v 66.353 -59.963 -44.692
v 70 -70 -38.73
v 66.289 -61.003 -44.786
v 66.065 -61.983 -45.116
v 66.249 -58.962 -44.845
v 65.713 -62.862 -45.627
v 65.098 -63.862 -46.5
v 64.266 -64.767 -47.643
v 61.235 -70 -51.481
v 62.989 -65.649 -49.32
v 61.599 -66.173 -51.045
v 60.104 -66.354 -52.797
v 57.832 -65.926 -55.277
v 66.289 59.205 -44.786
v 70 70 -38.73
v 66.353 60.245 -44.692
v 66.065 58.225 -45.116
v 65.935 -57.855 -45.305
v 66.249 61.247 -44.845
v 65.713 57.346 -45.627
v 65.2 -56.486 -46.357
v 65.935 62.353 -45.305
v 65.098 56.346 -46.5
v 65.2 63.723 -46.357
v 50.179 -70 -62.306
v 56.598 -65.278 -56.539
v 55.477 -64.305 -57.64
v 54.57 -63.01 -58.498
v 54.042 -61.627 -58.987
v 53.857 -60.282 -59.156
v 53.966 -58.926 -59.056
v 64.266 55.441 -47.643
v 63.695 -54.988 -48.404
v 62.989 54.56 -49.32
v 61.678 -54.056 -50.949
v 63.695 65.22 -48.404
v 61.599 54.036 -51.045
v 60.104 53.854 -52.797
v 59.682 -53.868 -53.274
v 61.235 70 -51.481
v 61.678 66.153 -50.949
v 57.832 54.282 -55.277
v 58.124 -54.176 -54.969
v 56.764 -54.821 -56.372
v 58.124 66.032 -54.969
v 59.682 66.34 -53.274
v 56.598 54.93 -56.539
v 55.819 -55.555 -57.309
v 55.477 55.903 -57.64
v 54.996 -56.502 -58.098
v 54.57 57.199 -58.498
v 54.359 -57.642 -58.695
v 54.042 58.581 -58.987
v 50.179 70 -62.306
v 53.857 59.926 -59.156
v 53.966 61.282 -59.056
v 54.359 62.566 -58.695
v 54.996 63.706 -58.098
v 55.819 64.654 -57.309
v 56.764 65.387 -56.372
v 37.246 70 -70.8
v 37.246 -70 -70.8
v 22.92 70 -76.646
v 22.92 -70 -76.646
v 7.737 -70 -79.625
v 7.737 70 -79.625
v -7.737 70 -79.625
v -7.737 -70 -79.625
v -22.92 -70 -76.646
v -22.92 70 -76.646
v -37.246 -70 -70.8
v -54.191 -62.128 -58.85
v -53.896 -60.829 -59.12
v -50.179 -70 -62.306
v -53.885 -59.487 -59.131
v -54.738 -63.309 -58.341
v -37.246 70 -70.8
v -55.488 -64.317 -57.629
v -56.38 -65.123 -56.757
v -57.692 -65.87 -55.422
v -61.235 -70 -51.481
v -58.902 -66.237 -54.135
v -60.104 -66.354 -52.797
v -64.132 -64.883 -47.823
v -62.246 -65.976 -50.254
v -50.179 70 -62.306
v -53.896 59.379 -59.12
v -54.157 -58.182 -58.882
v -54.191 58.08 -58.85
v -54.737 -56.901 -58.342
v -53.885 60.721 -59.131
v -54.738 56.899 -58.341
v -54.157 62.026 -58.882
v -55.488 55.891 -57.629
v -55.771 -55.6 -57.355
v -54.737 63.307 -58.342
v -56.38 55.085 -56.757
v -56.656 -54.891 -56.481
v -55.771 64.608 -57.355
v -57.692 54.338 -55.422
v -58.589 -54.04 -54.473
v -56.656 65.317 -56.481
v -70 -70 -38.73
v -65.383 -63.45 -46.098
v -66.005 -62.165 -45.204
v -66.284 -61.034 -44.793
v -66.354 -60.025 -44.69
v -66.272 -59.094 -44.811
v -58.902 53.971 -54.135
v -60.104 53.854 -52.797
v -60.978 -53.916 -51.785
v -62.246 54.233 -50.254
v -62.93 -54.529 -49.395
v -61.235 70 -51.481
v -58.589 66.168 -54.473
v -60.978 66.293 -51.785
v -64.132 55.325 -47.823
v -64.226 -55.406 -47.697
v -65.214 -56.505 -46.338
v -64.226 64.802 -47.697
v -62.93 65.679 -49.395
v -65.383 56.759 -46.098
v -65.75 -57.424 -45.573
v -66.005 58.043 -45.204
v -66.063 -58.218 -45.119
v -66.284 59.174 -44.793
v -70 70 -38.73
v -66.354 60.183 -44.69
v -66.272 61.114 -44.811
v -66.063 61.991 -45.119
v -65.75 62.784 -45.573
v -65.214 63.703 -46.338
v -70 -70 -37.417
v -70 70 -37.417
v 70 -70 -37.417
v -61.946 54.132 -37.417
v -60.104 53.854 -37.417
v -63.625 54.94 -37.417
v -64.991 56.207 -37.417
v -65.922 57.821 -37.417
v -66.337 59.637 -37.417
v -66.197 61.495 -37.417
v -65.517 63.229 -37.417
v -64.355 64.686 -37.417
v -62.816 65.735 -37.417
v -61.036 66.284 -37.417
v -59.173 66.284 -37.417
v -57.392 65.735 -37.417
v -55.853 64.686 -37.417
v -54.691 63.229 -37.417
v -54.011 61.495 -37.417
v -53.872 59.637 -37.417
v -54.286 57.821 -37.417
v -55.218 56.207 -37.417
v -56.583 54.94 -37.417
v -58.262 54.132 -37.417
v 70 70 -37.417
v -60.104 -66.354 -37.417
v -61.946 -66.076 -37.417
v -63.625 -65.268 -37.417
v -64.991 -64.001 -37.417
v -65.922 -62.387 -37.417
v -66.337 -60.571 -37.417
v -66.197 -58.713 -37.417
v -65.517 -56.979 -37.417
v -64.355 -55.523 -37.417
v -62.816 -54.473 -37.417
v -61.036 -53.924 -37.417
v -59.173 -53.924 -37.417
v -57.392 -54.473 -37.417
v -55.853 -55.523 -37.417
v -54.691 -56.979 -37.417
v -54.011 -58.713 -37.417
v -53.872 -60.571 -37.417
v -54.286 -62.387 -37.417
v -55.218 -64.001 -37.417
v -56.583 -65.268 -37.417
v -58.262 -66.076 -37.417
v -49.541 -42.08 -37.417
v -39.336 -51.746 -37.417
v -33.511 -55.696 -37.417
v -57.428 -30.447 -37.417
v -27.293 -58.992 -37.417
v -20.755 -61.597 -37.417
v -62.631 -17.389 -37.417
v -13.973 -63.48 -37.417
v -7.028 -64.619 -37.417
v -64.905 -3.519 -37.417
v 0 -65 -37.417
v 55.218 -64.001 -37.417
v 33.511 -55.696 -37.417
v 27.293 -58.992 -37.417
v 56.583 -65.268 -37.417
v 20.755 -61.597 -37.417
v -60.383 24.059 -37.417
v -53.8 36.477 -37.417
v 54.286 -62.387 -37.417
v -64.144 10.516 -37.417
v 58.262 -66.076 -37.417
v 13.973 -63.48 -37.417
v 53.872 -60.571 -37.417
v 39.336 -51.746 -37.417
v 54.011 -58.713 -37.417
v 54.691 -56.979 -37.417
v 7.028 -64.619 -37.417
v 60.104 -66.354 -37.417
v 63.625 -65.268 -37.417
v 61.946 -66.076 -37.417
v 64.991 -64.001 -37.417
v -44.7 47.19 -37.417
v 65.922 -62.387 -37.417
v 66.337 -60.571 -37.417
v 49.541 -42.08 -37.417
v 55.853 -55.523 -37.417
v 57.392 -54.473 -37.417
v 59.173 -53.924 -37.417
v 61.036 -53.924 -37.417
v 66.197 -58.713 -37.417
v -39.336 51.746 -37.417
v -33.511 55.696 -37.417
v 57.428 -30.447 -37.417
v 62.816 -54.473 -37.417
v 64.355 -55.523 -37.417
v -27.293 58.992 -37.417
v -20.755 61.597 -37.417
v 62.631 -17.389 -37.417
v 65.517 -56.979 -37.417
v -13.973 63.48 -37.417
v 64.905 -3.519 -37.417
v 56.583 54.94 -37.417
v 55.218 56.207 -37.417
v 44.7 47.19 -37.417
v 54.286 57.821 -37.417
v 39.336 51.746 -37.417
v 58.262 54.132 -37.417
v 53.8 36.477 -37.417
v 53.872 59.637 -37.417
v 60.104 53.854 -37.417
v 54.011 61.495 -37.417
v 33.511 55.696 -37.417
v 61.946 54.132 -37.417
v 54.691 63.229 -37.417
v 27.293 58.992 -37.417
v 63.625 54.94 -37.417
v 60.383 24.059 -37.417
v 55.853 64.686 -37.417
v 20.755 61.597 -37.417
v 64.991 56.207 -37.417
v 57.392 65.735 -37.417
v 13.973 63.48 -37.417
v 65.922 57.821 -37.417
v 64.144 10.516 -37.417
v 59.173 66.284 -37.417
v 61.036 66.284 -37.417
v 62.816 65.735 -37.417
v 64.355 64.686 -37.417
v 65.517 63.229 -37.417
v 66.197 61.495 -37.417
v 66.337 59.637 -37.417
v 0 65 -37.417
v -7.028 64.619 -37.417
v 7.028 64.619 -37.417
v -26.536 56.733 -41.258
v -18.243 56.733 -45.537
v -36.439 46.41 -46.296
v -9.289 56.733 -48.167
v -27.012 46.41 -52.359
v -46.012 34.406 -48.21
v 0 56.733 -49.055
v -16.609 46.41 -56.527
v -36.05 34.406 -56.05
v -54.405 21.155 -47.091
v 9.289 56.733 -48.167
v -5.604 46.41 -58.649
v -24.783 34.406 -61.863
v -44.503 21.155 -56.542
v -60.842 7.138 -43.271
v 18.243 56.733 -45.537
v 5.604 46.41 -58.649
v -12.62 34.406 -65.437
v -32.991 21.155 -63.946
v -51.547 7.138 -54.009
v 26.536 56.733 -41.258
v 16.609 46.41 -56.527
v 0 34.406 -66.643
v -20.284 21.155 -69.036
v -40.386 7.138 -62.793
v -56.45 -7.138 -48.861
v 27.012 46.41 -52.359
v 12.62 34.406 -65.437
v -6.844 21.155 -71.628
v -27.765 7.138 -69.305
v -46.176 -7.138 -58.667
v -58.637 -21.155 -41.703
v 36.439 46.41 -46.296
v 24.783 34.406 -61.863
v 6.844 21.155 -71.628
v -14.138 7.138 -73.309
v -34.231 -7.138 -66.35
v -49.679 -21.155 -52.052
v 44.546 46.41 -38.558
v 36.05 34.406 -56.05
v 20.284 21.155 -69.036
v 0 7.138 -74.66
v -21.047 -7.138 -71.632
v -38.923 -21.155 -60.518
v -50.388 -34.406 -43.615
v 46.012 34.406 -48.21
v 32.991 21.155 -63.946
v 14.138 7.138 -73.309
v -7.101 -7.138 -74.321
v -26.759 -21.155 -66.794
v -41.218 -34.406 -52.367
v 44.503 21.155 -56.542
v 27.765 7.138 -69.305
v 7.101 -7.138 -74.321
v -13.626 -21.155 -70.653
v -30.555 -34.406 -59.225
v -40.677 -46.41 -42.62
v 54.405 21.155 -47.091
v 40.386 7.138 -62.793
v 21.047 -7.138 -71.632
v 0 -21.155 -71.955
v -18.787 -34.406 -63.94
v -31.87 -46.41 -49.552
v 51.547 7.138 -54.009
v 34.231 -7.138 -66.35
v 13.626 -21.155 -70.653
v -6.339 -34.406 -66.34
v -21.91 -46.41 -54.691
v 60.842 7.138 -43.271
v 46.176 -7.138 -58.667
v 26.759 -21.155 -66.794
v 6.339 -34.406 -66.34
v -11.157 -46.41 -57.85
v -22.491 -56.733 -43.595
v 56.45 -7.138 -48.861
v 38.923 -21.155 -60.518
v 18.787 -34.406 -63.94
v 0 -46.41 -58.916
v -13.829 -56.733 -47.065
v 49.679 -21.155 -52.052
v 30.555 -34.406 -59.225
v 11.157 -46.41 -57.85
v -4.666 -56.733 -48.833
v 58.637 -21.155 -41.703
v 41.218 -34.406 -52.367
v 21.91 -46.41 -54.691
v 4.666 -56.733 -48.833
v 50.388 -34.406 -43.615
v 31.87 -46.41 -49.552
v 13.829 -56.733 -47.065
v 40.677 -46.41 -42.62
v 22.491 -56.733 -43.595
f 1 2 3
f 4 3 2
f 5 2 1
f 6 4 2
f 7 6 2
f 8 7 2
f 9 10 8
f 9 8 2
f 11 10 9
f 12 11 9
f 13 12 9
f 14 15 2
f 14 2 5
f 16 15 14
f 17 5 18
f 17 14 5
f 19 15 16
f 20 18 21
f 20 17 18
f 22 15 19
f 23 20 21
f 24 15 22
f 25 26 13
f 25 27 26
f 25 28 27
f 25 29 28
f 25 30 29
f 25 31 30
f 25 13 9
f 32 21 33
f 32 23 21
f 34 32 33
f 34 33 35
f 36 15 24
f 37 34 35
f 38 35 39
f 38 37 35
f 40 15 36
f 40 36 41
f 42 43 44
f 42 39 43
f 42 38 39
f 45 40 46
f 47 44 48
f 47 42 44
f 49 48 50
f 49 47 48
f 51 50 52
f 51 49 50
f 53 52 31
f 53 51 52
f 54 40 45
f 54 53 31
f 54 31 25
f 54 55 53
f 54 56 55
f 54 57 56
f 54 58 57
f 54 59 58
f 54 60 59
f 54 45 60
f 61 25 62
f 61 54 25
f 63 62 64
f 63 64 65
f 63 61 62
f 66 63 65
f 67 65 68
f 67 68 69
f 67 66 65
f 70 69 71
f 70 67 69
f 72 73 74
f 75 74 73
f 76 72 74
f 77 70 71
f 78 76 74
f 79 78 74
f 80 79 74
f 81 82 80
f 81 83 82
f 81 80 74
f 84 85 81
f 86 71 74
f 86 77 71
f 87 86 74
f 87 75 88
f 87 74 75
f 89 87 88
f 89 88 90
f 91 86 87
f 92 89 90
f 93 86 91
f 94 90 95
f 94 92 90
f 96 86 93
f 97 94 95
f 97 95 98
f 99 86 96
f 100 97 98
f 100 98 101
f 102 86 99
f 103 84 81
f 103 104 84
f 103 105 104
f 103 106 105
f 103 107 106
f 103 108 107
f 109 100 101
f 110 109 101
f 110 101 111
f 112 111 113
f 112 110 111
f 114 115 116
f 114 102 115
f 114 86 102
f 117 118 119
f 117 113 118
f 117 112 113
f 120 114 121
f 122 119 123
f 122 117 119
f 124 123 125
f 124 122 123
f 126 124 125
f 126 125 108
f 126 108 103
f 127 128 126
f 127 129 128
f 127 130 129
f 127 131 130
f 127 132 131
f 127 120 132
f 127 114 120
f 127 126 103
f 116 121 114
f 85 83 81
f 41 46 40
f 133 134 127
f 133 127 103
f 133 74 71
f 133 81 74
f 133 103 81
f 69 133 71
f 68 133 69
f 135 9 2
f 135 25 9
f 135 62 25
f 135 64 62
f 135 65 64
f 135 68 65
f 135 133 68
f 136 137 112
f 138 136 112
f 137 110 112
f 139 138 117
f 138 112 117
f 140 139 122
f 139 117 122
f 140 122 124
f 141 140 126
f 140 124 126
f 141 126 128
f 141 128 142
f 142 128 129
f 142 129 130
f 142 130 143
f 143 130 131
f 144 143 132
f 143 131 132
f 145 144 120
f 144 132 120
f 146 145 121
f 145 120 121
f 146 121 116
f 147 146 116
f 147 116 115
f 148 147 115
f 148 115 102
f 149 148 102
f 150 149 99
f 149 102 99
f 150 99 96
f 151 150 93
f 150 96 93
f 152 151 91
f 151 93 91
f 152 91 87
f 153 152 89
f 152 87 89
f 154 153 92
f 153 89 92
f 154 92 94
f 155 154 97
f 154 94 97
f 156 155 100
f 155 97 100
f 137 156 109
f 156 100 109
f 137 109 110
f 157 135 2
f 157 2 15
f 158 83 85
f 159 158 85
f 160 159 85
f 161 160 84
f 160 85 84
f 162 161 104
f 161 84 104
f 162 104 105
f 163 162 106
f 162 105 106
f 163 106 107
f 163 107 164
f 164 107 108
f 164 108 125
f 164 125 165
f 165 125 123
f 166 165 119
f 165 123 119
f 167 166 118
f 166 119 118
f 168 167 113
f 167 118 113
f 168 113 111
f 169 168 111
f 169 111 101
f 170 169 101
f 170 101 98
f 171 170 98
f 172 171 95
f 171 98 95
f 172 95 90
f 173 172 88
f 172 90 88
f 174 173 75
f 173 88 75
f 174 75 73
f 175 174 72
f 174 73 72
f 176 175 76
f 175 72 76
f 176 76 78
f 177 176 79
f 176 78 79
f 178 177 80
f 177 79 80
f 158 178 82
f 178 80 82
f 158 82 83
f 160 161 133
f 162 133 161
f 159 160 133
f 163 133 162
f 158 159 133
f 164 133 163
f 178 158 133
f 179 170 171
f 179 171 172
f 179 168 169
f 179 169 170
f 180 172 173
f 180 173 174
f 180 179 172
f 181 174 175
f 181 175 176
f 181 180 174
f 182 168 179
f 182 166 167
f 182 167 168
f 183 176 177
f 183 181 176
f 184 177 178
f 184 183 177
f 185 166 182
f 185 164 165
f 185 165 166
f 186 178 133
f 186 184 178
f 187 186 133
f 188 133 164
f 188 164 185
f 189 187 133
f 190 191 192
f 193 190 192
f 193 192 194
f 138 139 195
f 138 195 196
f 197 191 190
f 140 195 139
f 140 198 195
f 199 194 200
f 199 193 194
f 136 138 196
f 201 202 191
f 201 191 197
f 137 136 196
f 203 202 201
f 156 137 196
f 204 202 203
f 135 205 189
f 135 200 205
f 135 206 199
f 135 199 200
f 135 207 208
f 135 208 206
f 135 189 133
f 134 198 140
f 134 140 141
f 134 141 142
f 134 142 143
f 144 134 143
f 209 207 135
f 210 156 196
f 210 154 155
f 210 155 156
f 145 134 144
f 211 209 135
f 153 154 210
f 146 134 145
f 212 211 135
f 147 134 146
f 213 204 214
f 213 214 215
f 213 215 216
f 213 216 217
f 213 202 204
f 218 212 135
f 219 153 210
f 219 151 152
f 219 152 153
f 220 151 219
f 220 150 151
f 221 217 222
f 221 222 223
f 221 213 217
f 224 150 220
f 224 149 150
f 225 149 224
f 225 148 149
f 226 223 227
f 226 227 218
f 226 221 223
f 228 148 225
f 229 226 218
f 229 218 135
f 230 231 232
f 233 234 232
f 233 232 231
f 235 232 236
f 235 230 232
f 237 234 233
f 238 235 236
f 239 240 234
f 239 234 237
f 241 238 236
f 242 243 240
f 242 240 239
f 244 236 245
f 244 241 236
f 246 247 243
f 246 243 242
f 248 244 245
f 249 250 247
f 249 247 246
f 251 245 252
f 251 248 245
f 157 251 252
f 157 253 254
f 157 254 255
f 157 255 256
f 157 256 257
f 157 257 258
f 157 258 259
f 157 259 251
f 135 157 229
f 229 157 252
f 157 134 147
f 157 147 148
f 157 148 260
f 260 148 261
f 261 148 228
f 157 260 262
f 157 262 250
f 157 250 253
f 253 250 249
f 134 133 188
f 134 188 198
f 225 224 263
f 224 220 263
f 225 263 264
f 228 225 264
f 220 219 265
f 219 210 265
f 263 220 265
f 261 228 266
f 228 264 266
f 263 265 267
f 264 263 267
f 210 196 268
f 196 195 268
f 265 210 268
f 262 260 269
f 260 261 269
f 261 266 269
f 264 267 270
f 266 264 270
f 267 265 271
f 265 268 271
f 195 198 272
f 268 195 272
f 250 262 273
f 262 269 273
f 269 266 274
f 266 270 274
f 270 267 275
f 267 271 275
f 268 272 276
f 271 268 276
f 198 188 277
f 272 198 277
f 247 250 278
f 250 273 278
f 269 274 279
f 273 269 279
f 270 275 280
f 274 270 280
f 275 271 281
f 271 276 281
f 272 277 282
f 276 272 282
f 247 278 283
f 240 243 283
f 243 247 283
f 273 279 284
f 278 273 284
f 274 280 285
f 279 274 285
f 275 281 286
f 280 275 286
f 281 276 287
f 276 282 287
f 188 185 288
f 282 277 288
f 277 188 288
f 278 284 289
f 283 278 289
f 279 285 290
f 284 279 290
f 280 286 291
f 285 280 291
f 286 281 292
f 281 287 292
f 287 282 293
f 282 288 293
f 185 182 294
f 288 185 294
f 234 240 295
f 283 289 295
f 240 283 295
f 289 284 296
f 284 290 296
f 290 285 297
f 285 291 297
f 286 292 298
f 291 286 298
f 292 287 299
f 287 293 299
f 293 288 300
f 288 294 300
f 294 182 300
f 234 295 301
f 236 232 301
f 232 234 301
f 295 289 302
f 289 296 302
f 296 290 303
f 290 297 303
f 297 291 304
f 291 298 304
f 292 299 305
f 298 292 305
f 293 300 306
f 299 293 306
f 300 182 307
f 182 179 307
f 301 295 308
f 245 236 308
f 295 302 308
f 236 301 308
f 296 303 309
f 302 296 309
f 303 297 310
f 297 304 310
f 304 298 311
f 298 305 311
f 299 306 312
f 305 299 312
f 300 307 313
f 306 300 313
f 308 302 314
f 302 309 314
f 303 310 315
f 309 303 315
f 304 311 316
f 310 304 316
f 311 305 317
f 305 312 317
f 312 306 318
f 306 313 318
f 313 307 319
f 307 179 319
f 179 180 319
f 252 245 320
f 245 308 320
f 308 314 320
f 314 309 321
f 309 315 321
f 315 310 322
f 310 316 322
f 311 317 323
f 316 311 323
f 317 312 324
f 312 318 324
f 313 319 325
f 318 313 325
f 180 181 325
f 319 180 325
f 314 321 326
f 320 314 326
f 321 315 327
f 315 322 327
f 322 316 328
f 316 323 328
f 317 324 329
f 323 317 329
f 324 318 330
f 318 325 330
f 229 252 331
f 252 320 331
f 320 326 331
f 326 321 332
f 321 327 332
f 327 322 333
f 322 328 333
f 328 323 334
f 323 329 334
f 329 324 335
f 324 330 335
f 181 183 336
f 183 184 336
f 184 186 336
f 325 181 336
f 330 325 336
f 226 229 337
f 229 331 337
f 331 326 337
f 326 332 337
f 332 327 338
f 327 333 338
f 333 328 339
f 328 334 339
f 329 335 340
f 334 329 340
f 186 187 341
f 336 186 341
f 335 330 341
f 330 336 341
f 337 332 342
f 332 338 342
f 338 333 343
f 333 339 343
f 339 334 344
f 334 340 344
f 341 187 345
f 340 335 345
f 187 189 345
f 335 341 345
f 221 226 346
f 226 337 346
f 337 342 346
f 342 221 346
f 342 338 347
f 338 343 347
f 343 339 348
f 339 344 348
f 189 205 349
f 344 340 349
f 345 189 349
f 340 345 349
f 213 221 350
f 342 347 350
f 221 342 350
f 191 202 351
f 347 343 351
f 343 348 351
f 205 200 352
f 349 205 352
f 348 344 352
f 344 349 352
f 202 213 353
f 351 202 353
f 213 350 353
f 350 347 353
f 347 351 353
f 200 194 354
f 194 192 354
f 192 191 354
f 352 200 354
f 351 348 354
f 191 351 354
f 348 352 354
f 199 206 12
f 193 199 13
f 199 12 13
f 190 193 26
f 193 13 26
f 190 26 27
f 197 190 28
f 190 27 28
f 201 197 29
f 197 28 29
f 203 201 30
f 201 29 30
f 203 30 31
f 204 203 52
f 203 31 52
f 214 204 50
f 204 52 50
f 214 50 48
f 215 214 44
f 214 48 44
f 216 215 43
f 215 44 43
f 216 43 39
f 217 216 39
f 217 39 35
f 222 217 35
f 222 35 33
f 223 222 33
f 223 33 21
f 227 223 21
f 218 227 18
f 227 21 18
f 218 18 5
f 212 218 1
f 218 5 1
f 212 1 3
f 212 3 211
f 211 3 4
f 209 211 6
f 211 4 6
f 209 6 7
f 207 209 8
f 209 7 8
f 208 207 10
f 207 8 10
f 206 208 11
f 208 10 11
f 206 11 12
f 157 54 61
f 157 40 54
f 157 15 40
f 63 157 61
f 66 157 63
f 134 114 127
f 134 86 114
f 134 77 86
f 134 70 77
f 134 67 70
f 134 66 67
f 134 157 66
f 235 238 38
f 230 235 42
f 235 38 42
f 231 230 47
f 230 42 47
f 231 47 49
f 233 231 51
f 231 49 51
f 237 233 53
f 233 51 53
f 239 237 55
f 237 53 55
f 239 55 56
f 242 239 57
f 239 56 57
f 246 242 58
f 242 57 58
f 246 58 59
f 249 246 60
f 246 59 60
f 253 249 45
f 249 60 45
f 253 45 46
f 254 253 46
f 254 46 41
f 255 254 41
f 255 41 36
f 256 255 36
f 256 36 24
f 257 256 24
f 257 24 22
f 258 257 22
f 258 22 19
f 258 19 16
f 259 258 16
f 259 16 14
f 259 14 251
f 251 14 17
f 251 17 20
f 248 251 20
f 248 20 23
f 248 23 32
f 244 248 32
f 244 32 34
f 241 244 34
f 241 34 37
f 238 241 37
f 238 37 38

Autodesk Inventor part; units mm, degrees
ref_plane "YZ Plane" through (0, 0, 0) normal (1, 0, 0) x (0, 1, 0)
sketch "Sketch11" plane through (0, 0, 0) normal (0, 0, 1) x (1, 0, 0)
  line L0 (-65, -65) -> (65, -65)
  line L1 (65, -65) -> (65, 65)
  line L2 (65, 65) -> (-65, 65)
  line L3 (-65, 65) -> (-65, -65)
  line L4 (-65, -65) -> (65, 65) construction
  line L5 (65, -65) -> (-65, 65) construction
  point P0 (0, 0)
  dimension "d36" = 130
  dimension "d37" = 130
extrude "Extrusion5" add sketch "Sketch11" against normal blind 150
sketch "Sketch12" plane through (0, 0, 0) normal (0, 0, 1) x (1, 0, 0)
  arc A0 (0, 75) -> (0, -75) centre (0, 0) ccw
  line L0 (0, 0) -> (0, 75) construction
  line L1 (0, 0) -> (75, 0) construction
  line L2 (0, 0) -> (0, -75) construction
  line L3 (0, 75) -> (0, -75)
  dimension "d40" = 75
  dimension "d41" = 90
  dimension "d42" = 180
revolve "Revolution5" cut sketch "Sketch12" angle 180 about axis through (0, 0, 0) along (0, -1, 0)
ref_plane "Work Plane2" through (0, 65, -37.4166) normal (0, 0, 1) x (1, 0, 0)
sketch "Sketch13" plane through (0, 65, -37.4166) normal (0, 0, 1) x (1, 0, 0)
  line L0 (-65, -130) -> (65, -130)
  line L1 (65, -130) -> (65, 0)
  line L2 (65, 0) -> (-65, 0)
  line L3 (-65, 0) -> (-65, -130)
  line L4 (-65, -130) -> (65, 0) construction
  line L5 (65, -130) -> (-65, 0) construction
  point P0 (0, -65)
  dimension "d45" = 130
  dimension "d46" = 130
extrude "Extrusion6" cut sketch "Sketch13" along normal blind 50
sketch "Sketch14" plane through (0, 65, -37.4166) normal (0, 0, 1) x (1, 0, 0)
  line L0 (-65, -130) -> (65, -130)
  line L1 (65, -130) -> (65, 0)
  line L2 (65, 0) -> (-65, 0)
  line L3 (-65, 0) -> (-65, -130)
  line L4 (-65, -130) -> (65, 0) construction
  line L5 (65, -130) -> (-65, 0) construction
  line L6 (-70, -135) -> (70, -135)
  line L7 (70, -135) -> (70, 5)
  line L8 (70, 5) -> (-70, 5)
  line L9 (-70, 5) -> (-70, -135)
  line L10 (-70, -135) -> (70, 5) construction
  line L11 (70, -135) -> (-70, 5) construction
  point P0 (0, -65)
  dimension "d49" = 130
  dimension "d50" = 130
  dimension "d51" = 140
  dimension "d52" = 140
extrude "Extrusion7" add sketch "Sketch14" against normal blind 75
sketch "Sketch17" plane through (0, 0, 0) normal (1, 0, 0) x (0, 1, 0)
  arc A0 (-80, 0) -> (80, 0) centre (0, 0) ccw
  line L0 (0, 0) -> (80, 0) construction
  line L1 (0, 0) -> (80, 0) construction
  line L2 (0, 0) -> (-80, 0) construction
  dimension "d57" = 80
  dimension "d58" = 0
  dimension "d59" = 180
sketch "Sketch18" plane through (-65, 65, -150) normal (0, 1, 0) x (1, 0, 0)
  line L0 (0, -37.5834) -> (130, -37.5834)
  line L1 (130, -37.5834) -> (130, 0)
  line L2 (130, 0) -> (0, 0)
  line L3 (0, 0) -> (0, -37.5834)
  point P0 (65, -150)
extrude "Extrusion9" cut sketch "Sketch18" against normal blind 140
ref_plane "Work Plane3" through (0, 0, 0) normal (0, 1, 0) x (-1, 0, 0)
sketch "Sketch22" plane through (0, 0, 0) normal (0, 1, 0) x (-1, 0, 0)
  arc A0 (-65, -37.4166) -> (65, -37.4166) centre (0, 0) ccw projected
  line L0 (0, -75) -> (0, 0)
  circle A1 centre (0, 0) radius 80
  circle A2 centre (0, 0) radius 150
  dimension "d74" = 160
  dimension "d75" = 300
extrude "Extrusion10" cut sketch "Sketch22" against normal blind 100 and the other way blind 100
sketch "Sketch24" plane through (0, 65, -37.4166) normal (0, 0, 1) x (1, 0, 0)
  circle A0 centre (-60.1041, -4.8959) radius 2
  point P0 (0, -65)
  dimension "d80" = 4
  dimension "d81" = 85
  dimension "d85" = 60.1041
sketch "Sketch25" plane through (0, 65, -37.4166) normal (0, 0, 1) x (1, 0, 0)
  circle A0 centre (60.1041, -4.8959) radius 2
  point P0 (0, -65)
  dimension "d82" = 4
  dimension "d83" = 85
  dimension "d84" = 60.1041
sketch "Sketch26" plane through (0, 65, -37.4166) normal (0, 0, 1) x (1, 0, 0)
  circle A0 centre (-60.1041, -125.1041) radius 2
  point P0 (0, -65)
  dimension "d86" = 4
  dimension "d87" = 85
  dimension "d88" = 60.1041
sketch "Sketch27" plane through (0, 65, -37.4166) normal (0, 0, 1) x (1, 0, 0)
  circle A0 centre (60.1041, -125.1041) radius 2
  point P0 (0, -65)
  dimension "d89" = 4
  dimension "d90" = 85
  dimension "d91" = 60.1041
hole "Hole1" at (-60.1041, 60.1041, -37.4166) direction (0, 0, -1) diameter 12.5 end through all
hole "Hole2" at (60.1041, 60.1041, -37.4166) direction (0, 0, -1) diameter 12.5 end through all
hole "Hole3" at (60.1041, -60.1041, -37.4166) direction (0, 0, -1) diameter 12.5 end through all
hole "Hole4" at (-60.1041, -60.1041, -37.4166) direction (0, 0, -1) diameter 12.5 end through all
equation "\"d37\" = d36"
equation "\"d46\" = d45"
properties part number "Custom Mirror Design"
